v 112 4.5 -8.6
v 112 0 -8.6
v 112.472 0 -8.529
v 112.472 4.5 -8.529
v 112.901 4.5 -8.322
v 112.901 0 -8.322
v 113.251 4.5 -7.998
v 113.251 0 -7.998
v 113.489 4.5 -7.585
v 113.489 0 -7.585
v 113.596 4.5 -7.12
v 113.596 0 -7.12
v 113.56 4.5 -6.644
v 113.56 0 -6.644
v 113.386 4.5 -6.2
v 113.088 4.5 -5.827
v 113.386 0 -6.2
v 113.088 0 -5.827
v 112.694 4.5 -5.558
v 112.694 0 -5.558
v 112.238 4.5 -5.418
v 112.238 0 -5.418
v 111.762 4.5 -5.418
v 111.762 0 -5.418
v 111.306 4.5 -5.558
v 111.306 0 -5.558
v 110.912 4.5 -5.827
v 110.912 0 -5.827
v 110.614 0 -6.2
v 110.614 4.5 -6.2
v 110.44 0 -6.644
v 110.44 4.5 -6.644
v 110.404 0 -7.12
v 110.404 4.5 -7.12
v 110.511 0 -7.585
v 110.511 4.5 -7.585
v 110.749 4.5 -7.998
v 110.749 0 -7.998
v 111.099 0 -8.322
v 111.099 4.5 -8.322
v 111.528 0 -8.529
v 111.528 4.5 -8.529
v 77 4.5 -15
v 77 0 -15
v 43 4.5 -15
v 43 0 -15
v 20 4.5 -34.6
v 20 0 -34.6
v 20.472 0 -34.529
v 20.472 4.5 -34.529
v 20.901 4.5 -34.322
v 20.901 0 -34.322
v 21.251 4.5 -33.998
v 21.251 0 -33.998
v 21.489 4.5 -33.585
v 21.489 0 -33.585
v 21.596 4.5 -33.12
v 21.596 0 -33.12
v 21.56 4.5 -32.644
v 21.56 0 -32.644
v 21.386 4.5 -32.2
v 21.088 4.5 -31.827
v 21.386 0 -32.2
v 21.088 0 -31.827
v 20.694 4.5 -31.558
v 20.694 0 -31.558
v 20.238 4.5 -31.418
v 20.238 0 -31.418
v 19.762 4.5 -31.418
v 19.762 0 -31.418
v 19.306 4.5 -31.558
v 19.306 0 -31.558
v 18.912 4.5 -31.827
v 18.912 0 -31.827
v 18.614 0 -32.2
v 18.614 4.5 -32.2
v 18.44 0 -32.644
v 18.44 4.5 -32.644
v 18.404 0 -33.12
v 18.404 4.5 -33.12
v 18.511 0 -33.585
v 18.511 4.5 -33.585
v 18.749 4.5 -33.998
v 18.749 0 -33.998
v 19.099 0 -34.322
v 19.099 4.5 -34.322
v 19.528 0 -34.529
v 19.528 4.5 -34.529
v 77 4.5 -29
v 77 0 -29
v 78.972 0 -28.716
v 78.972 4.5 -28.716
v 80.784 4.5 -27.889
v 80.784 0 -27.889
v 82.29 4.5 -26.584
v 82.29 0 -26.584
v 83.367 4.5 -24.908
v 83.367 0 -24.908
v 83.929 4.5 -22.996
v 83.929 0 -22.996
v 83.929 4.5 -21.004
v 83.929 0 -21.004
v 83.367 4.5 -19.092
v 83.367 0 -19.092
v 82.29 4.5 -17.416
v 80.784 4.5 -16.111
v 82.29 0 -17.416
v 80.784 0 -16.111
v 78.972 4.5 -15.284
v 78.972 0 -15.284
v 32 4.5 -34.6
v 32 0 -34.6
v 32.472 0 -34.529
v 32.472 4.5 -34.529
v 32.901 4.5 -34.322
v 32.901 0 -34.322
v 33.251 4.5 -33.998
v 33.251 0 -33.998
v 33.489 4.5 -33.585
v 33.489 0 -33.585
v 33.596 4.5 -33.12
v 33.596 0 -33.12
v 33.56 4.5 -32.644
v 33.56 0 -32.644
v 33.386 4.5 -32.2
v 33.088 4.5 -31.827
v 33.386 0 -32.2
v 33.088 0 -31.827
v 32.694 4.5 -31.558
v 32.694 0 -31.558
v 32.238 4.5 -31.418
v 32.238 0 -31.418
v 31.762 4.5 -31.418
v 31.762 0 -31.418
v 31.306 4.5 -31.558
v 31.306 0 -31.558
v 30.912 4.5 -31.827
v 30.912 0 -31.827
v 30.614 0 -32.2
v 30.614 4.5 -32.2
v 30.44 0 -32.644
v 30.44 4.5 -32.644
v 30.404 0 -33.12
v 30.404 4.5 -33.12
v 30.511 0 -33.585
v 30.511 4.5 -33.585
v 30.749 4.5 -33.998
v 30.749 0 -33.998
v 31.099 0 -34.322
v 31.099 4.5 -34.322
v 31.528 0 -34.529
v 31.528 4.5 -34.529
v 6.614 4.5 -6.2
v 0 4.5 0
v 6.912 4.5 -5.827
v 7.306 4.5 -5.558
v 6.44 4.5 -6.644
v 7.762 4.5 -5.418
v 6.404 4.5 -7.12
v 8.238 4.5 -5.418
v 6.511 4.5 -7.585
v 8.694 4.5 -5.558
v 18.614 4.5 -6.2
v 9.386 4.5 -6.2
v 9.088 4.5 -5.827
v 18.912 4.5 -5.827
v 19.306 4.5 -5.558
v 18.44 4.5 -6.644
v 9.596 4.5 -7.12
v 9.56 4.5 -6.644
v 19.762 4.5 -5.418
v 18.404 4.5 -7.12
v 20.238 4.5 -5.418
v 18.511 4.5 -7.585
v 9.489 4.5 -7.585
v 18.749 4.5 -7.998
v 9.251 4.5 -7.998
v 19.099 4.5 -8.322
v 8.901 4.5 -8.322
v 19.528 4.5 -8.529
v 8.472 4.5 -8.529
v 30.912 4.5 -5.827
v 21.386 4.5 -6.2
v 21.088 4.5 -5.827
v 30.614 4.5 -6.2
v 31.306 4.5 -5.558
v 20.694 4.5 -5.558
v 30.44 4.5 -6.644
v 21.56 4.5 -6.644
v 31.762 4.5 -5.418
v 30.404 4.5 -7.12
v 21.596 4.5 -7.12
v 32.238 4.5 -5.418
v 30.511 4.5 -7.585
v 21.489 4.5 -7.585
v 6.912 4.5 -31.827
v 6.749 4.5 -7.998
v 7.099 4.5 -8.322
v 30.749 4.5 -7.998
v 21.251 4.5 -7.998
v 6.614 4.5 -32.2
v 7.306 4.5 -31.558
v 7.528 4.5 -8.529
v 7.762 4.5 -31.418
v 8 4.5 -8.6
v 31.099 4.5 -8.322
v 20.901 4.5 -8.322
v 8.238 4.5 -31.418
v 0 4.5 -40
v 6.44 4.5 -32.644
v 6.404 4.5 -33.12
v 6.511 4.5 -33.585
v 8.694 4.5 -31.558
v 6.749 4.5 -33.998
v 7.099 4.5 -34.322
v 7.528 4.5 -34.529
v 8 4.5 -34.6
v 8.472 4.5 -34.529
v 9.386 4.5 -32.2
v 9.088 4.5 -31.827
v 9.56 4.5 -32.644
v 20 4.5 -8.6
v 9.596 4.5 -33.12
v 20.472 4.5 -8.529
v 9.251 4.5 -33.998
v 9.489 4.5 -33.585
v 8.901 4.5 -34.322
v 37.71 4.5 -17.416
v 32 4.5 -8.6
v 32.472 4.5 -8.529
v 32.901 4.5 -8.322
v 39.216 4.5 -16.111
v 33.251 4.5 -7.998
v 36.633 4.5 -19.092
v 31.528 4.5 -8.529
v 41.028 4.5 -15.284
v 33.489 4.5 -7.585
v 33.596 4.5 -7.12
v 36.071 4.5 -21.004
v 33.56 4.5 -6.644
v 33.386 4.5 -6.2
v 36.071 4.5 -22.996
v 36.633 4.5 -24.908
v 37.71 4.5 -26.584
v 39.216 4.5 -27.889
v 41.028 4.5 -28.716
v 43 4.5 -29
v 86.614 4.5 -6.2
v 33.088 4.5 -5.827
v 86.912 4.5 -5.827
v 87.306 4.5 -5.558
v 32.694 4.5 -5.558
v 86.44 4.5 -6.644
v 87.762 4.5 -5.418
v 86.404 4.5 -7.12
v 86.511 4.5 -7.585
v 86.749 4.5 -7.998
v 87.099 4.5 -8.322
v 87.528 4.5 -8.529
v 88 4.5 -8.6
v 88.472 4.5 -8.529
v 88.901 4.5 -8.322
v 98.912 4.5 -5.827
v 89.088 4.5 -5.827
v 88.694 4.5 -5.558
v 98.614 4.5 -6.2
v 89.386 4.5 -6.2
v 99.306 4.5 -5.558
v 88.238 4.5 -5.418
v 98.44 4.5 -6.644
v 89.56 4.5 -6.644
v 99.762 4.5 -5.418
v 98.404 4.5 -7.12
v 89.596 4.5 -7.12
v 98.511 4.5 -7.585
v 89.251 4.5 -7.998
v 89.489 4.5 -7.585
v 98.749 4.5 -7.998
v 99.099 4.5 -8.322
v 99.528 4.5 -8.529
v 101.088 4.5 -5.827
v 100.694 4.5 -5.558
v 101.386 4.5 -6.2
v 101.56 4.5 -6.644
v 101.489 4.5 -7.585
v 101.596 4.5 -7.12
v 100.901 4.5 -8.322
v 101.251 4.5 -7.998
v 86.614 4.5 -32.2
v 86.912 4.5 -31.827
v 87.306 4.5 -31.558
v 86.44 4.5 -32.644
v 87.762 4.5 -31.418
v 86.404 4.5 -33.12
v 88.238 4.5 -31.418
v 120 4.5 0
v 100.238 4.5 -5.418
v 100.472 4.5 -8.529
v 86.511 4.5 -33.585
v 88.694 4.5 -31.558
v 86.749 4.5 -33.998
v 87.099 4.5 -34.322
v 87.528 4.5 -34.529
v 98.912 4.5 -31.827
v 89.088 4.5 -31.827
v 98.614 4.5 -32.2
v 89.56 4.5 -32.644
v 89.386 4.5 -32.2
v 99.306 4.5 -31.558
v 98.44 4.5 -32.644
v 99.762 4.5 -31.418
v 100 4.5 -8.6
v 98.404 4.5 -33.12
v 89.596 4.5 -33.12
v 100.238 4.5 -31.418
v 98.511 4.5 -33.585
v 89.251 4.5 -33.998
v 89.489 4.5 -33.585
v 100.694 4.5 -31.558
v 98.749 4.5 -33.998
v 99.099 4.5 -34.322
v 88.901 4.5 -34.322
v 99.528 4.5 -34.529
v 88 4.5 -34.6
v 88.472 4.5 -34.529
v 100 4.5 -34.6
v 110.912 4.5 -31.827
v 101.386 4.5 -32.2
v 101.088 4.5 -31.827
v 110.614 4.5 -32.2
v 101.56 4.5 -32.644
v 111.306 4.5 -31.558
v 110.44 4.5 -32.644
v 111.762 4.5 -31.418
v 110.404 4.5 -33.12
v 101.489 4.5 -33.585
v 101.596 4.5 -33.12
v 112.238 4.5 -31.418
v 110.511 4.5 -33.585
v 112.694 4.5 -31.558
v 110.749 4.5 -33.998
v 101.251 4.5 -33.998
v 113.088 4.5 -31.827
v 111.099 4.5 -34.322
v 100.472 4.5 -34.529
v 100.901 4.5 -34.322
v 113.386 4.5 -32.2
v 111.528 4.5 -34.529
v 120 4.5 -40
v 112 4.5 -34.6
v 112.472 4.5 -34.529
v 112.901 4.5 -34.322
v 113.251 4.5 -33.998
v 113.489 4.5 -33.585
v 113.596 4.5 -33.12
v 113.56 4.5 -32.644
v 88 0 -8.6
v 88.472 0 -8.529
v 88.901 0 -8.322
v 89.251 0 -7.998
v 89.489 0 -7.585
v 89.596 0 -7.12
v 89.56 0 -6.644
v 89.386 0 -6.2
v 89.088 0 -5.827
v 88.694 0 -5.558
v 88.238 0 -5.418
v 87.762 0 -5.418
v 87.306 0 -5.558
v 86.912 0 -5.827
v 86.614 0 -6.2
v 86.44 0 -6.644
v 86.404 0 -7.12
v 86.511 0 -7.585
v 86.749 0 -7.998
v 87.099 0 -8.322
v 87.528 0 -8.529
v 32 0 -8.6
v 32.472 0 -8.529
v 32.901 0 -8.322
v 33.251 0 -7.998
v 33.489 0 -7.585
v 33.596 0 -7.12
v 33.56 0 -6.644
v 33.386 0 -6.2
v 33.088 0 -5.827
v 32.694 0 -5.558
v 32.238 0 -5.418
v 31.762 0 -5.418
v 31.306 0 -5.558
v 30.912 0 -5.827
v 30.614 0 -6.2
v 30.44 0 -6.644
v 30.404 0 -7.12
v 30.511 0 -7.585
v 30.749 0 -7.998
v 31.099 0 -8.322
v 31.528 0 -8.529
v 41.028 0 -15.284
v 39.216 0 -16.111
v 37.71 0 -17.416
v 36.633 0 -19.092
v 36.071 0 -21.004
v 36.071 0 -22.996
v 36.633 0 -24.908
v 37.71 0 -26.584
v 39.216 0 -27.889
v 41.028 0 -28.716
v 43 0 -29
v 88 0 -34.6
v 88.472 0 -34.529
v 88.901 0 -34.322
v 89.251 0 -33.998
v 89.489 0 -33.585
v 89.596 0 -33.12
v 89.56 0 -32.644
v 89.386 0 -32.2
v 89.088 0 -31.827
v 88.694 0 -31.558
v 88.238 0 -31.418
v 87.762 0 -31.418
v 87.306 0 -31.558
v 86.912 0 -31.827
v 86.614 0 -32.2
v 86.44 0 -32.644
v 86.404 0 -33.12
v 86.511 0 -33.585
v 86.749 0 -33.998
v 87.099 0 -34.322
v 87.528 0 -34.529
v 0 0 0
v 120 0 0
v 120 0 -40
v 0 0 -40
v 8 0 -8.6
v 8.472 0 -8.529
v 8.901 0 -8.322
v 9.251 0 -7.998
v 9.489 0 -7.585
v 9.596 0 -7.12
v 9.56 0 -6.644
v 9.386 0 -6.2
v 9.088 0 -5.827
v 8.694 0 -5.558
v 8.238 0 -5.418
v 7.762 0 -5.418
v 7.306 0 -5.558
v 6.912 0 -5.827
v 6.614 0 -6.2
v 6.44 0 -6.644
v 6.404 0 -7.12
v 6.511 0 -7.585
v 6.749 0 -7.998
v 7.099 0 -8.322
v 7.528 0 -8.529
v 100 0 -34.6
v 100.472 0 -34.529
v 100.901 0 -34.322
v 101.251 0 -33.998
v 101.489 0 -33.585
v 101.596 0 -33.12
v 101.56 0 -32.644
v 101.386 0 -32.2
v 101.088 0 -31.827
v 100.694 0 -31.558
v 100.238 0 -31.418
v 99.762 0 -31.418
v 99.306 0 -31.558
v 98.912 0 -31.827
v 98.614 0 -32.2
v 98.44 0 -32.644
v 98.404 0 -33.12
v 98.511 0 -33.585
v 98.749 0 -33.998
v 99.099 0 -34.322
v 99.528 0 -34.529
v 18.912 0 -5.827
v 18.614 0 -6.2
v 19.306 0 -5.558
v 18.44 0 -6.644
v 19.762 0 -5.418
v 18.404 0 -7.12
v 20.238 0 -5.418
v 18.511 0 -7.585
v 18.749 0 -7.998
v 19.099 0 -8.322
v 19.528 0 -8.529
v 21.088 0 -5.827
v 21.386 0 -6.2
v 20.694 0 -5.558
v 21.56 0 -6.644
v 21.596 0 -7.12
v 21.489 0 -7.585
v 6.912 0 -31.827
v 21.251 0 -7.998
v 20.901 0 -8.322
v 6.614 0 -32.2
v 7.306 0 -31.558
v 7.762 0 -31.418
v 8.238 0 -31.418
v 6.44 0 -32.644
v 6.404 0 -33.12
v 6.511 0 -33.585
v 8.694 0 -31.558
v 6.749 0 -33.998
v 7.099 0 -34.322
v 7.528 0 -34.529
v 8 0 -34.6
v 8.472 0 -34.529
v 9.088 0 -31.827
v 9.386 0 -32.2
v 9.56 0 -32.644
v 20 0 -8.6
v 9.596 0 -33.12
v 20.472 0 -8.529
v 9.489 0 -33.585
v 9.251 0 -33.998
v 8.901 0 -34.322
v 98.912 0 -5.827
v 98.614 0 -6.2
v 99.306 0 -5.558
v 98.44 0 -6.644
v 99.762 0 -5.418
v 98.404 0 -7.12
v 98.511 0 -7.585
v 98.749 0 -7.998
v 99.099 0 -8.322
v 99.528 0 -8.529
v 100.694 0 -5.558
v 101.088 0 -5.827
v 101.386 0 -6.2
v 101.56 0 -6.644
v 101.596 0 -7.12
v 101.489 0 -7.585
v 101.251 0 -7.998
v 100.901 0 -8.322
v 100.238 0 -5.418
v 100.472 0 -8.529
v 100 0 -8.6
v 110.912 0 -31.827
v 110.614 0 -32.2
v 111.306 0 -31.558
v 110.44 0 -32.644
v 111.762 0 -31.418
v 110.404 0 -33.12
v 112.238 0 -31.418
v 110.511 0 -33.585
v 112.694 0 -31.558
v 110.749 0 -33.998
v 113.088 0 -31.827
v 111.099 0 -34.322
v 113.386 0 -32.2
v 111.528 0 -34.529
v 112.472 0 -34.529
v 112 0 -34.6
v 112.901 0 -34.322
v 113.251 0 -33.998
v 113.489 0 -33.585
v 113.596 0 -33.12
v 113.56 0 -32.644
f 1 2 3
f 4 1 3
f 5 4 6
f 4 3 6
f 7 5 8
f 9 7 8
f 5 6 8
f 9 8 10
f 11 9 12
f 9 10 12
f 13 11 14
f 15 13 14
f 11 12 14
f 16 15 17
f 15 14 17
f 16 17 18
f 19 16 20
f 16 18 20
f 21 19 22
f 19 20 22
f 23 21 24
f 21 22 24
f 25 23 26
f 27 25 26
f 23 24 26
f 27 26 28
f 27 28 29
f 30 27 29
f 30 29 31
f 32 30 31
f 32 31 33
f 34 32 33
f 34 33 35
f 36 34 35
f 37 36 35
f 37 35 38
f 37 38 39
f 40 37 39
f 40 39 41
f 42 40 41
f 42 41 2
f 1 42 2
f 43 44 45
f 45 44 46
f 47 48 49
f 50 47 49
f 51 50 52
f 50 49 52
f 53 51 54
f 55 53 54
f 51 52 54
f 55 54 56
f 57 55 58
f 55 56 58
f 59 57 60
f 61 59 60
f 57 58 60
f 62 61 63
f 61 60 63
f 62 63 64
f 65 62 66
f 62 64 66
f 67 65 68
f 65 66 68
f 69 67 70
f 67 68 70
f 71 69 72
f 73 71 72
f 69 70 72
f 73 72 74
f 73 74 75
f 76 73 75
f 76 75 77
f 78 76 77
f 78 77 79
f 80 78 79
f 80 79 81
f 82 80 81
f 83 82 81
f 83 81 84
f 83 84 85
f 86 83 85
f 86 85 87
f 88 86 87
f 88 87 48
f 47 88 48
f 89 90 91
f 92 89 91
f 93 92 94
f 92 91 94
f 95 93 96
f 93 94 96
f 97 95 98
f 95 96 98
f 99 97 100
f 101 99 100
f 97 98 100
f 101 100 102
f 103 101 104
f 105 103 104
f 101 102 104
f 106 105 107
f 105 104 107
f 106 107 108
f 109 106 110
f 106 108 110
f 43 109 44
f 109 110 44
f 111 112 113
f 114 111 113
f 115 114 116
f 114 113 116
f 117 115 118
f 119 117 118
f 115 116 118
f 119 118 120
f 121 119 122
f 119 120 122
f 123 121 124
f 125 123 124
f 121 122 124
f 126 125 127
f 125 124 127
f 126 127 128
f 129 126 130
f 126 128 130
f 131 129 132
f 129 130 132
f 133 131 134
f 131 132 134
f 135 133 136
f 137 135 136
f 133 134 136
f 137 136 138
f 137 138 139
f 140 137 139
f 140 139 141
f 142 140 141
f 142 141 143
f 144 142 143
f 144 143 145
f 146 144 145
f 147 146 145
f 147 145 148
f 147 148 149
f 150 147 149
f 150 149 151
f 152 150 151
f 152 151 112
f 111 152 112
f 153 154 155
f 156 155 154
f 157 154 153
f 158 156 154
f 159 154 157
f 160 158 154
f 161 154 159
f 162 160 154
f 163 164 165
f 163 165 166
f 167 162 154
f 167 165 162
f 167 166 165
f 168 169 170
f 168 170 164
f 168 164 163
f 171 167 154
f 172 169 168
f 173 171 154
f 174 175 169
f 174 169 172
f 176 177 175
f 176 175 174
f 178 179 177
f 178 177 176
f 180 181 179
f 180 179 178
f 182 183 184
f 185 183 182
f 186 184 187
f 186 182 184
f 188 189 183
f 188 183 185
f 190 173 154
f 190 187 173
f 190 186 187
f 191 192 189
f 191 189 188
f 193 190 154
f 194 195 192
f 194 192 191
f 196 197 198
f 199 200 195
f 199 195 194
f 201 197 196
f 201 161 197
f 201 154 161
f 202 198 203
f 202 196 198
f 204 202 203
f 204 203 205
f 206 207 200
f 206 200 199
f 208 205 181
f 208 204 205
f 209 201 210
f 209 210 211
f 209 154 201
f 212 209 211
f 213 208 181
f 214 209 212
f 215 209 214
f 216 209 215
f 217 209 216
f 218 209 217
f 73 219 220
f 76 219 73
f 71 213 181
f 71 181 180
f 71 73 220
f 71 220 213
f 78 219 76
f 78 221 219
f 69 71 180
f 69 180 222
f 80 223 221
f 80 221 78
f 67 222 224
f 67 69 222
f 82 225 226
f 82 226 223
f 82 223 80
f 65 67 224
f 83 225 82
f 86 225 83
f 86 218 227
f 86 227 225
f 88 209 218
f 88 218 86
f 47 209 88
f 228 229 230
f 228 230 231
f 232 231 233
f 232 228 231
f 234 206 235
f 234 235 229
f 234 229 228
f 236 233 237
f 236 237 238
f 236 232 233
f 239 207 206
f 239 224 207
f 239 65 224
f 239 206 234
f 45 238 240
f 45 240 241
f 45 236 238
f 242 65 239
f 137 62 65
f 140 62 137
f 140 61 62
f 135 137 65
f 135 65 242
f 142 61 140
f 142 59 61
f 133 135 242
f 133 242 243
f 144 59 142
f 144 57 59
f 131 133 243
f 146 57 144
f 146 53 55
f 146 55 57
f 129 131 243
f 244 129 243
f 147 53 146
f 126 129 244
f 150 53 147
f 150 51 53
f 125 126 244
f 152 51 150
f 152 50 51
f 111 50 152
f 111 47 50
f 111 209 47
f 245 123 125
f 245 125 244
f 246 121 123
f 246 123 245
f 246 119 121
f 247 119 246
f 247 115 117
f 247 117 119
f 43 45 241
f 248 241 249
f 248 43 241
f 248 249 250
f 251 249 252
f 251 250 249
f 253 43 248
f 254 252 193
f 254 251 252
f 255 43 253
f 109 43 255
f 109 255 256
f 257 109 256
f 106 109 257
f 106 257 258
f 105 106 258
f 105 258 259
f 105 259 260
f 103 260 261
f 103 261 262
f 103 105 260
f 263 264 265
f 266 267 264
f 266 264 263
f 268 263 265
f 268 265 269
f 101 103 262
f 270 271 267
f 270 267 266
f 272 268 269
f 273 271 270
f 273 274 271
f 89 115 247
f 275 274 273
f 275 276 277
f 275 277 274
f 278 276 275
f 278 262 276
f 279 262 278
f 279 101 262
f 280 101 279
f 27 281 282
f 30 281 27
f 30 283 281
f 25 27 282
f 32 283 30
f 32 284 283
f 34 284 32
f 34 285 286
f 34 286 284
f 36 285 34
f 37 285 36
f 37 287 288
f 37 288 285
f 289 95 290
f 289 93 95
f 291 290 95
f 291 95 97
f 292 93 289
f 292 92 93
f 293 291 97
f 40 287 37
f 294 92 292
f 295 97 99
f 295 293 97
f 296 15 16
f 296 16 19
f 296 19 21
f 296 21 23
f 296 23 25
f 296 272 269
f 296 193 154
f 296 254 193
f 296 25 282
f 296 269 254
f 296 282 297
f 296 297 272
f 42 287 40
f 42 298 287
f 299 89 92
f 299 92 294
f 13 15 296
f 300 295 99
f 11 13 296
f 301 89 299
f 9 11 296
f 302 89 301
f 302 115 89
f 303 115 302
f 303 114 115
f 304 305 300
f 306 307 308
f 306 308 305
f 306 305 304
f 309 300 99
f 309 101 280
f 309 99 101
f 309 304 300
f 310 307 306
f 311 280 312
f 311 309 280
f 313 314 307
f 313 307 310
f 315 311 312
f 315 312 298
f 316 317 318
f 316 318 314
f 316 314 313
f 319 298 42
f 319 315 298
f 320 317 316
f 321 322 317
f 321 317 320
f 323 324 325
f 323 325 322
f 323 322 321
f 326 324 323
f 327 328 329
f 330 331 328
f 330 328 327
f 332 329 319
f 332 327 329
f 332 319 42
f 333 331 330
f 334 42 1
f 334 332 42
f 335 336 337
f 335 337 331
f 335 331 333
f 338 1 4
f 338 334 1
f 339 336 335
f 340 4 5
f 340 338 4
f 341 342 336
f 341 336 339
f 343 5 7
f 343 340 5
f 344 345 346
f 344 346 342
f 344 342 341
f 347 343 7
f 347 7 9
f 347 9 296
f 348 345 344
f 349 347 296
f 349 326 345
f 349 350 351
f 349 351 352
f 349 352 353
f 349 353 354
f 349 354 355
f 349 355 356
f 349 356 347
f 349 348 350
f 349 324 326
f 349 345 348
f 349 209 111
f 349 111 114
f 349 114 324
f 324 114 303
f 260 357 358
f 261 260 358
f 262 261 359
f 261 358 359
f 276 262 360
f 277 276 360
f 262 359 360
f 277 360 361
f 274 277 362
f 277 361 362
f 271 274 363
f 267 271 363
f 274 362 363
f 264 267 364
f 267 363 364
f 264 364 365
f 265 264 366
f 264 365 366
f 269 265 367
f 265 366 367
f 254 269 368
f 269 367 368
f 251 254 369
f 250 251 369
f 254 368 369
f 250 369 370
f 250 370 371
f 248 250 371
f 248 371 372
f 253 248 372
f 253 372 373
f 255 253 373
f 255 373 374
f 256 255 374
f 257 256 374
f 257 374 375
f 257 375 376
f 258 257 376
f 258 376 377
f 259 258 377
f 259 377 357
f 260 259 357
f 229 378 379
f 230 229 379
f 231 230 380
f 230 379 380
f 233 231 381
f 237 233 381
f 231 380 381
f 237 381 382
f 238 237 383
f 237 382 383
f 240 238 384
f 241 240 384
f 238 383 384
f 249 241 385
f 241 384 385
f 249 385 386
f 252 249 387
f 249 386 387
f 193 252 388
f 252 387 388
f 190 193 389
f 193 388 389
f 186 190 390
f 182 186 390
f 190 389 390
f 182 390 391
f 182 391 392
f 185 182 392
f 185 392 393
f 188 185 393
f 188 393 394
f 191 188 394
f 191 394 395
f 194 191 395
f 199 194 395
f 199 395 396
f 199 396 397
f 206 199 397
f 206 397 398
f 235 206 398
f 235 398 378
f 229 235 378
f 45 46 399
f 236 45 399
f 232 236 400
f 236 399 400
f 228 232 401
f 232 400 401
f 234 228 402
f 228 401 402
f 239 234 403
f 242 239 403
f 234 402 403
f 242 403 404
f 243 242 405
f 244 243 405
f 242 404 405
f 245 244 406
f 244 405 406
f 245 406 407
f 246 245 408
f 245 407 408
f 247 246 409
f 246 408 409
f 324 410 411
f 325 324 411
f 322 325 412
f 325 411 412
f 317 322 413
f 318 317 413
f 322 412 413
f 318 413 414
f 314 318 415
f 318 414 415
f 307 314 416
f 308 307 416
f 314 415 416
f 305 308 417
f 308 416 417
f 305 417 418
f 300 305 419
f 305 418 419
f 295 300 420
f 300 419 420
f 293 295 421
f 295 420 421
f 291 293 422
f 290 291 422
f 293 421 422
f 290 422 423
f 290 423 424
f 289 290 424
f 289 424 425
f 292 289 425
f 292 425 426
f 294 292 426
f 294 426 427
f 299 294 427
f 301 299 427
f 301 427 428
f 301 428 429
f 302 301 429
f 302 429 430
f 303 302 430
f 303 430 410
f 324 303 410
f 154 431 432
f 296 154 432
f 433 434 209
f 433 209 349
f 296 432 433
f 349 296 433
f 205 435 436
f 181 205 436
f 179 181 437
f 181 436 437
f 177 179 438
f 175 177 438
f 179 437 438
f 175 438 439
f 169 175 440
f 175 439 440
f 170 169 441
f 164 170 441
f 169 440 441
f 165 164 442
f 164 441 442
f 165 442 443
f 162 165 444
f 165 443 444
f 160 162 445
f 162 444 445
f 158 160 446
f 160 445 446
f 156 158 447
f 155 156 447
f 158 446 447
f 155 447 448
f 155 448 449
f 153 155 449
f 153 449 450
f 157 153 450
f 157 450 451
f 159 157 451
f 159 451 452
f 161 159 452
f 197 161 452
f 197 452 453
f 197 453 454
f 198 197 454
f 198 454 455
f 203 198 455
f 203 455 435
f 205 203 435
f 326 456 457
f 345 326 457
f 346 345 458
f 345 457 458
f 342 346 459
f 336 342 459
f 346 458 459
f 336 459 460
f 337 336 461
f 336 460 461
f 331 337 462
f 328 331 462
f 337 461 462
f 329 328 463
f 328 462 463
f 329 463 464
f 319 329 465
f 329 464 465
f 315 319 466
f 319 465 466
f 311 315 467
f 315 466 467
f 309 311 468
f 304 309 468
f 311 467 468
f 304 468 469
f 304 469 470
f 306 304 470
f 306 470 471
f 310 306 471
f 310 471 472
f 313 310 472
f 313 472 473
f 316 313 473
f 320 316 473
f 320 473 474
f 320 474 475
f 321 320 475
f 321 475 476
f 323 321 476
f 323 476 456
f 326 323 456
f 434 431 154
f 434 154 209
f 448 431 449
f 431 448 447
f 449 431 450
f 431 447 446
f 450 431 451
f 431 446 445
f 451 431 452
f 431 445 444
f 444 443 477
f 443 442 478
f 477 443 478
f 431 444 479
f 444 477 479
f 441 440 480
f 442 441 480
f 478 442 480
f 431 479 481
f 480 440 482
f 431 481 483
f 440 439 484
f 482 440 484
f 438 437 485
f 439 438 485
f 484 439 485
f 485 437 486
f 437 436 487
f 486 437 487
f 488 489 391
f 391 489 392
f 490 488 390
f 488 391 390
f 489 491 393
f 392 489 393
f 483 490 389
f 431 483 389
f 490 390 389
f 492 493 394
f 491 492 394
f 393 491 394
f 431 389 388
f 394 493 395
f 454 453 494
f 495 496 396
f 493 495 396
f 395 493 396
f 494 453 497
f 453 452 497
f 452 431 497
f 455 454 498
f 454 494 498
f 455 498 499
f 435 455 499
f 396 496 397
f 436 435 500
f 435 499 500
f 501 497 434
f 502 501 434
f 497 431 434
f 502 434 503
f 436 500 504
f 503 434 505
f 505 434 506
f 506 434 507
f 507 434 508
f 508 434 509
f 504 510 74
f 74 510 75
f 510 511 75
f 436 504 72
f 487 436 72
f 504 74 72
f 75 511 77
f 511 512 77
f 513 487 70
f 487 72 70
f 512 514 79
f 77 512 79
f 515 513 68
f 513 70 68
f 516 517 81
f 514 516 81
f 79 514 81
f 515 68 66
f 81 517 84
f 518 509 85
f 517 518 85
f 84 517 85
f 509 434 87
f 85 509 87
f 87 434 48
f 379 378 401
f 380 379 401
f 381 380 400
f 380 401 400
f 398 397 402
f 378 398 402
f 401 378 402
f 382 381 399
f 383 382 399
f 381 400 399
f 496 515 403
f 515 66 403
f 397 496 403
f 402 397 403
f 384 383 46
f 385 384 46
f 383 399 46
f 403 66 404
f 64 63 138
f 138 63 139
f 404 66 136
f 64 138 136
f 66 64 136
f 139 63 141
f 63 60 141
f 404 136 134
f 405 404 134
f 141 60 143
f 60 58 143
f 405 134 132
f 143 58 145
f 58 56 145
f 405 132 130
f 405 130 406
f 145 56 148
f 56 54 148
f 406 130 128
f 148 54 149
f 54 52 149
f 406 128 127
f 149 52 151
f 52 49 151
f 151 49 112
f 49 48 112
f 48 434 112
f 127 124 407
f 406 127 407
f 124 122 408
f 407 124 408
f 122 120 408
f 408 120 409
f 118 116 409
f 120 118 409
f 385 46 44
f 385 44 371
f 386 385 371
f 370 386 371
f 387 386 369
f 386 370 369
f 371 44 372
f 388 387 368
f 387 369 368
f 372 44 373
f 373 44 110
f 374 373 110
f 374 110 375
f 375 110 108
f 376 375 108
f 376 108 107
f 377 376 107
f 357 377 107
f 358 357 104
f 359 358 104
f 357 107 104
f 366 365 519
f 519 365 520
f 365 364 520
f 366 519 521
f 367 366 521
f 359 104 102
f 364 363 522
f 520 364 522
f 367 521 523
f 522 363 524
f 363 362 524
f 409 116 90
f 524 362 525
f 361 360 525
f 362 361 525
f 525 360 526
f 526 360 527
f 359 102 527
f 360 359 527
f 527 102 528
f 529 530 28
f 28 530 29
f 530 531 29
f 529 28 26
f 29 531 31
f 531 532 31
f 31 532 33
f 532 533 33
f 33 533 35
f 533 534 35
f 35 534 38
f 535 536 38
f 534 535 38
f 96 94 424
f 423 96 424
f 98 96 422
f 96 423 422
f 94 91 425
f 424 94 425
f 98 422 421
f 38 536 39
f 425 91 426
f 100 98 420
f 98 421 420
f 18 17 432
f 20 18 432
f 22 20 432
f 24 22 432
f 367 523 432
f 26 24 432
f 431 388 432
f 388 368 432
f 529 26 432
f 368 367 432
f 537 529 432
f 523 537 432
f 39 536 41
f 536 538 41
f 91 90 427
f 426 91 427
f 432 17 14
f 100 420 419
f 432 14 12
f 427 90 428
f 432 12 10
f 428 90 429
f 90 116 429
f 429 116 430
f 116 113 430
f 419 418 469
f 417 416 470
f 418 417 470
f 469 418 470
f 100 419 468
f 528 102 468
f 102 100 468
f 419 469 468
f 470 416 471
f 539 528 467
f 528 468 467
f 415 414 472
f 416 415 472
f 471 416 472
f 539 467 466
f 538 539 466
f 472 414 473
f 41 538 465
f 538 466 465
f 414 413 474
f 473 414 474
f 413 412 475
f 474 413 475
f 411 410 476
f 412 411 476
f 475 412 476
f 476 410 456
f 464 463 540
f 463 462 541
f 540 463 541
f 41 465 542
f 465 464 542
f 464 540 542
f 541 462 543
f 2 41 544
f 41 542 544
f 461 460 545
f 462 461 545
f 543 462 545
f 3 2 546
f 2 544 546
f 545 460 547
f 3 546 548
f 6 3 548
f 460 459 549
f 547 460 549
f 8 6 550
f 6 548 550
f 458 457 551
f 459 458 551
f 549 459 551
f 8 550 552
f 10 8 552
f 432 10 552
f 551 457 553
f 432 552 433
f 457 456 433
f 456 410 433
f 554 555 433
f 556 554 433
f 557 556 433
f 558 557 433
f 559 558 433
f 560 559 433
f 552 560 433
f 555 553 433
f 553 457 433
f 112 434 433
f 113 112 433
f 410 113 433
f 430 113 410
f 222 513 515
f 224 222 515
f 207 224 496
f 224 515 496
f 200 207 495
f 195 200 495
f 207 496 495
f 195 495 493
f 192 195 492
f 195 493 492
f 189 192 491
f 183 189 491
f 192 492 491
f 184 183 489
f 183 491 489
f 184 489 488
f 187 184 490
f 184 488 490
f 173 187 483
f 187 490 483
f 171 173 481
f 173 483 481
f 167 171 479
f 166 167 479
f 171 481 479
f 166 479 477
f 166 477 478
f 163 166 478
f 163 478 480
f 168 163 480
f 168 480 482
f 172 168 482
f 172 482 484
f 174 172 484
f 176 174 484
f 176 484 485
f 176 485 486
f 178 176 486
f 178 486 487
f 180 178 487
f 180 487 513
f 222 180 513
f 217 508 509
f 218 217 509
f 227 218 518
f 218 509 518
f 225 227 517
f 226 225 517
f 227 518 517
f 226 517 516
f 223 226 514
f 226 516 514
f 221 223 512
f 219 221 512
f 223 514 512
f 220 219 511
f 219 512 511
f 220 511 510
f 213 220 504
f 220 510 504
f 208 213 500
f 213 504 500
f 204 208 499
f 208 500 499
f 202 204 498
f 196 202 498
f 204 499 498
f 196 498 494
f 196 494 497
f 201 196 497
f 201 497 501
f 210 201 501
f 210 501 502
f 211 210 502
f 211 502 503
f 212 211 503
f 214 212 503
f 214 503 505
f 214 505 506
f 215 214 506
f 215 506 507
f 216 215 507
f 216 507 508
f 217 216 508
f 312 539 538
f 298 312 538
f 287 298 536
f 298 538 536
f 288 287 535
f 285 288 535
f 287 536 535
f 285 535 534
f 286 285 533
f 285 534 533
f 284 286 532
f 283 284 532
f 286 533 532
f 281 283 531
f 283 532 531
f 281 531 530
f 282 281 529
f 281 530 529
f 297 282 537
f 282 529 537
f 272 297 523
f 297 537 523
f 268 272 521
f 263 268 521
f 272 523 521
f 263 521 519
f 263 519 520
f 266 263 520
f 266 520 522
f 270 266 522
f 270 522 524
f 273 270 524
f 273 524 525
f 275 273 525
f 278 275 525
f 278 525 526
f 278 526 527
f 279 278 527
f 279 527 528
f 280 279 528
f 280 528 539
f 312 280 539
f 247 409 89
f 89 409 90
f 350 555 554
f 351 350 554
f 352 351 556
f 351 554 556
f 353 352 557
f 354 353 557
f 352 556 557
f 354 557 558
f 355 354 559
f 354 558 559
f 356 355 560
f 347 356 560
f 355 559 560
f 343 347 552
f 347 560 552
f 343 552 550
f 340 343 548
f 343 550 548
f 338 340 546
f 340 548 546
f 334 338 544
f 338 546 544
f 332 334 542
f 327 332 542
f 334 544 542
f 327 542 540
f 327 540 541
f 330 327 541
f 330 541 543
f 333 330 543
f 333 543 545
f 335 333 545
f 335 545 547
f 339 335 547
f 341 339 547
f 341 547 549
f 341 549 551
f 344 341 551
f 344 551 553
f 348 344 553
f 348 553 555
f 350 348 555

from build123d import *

# Parameters (mm, degrees)
SKETCH_1_W          = 120
SKETCH_1_H          = 40
EXTRUDE_1_DEPTH     = 4.5
SKETCH_2_R          = 1.6
CUT_EXTRUDE_1_DEPTH = 127.571126249


with BuildPart() as part:
    # 草图1 → 凸台-拉伸1 (new body)
    with BuildSketch(Plane(origin=(0, 0, 0), x_dir=(1, 0, 0), z_dir=(0, 1, 0))):
        with Locations((60, 20)):
            Rectangle(SKETCH_1_W, SKETCH_1_H)
    extrude(amount=EXTRUDE_1_DEPTH)

    # 草图2 → 切除-拉伸1 (cut, through all)
    with BuildSketch(Plane.XZ):
        with Locations(Location((8, -7, 0), (0, 0, 270))):
            Circle(SKETCH_2_R)
        with Locations(Location((32, -33, 0), (0, 0, 270))):
            Circle(SKETCH_2_R)
        with Locations(Location((32, -7, 0), (0, 0, 270))):
            Circle(SKETCH_2_R)
        with Locations(Location((100, -33, 0), (0, 0, 270))):
            Circle(SKETCH_2_R)
        with Locations(Location((20, -33, 0), (0, 0, 270))):
            Circle(SKETCH_2_R)
        with Locations(Location((100, -7, 0), (0, 0, 270))):
            Circle(SKETCH_2_R)
        with Locations(Location((20, -7, 0), (0, 0, 270))):
            Circle(SKETCH_2_R)
        with Locations(Location((112, -33, 0), (0, 0, 270))):
            Circle(SKETCH_2_R)
        with Locations(Location((112, -7, 0), (0, 0, 270))):
            Circle(SKETCH_2_R)
        with Locations(Location((8, -33, 0), (0, 0, 270))):
            Circle(SKETCH_2_R)
        with Locations(Location((88, -33, 0), (0, 0, 270))):
            Circle(SKETCH_2_R)
        with Locations(Location((88, -7, 0), (0, 0, 270))):
            Circle(SKETCH_2_R)
        with BuildLine():
            Line((77, -15), (43, -15))
            ThreePointArc((43, -15), (36, -22), (43, -29))
            Line((43, -29), (77, -29))
            ThreePointArc((77, -29), (84, -22), (77, -15))
        make_face()
    extrude(amount=-CUT_EXTRUDE_1_DEPTH, mode=Mode.SUBTRACT)


solid = part.part
